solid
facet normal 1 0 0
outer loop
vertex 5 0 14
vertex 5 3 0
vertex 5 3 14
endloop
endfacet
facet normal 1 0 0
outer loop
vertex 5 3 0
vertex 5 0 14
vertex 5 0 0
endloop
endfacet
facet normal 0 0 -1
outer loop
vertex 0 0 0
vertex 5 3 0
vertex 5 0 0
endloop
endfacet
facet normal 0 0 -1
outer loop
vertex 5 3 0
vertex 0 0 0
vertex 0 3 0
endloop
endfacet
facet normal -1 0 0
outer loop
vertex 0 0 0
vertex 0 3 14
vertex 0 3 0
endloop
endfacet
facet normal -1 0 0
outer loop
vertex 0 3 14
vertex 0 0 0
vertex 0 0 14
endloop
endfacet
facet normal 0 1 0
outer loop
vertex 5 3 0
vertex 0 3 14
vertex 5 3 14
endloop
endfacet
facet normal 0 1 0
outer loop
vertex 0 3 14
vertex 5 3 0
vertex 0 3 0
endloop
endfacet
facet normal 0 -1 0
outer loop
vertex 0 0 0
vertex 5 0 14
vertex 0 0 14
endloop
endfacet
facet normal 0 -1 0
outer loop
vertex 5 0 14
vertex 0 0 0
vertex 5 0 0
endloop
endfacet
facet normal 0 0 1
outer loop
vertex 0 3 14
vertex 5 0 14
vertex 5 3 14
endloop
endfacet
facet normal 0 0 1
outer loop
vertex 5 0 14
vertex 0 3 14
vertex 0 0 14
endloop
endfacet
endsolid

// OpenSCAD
translate([2.5, 1.5, 1.0]) color([0.4049341374504143, 0.7837985890347726, 0.30331272607892745]) cube([5, 3, 2], center=true);
translate([2.5, 1.5, 3.0]) color([0.4765969541523558, 0.5833820394550312, 0.9081128851953352]) cube([5, 3, 2], center=true);
translate([2.5, 1.5, 5.0]) color([0.5046868558173903, 0.28183784439970383, 0.7558042041572239]) cube([5, 3, 2], center=true);
translate([2.5, 1.5, 7.0]) color([0.6183689966753316, 0.25050634136244054, 0.9097462559682401]) cube([5, 3, 2], center=true);
translate([2.5, 1.5, 9.0]) color([0.9827854760376531, 0.8102172359965896, 0.9021659504395827]) cube([5, 3, 2], center=true);
translate([2.5, 1.5, 11.0]) color([0.3101475693193326, 0.7298317482601286, 0.8988382879679935]) cube([5, 3, 2], center=true);
translate([2.5, 1.5, 13.0]) color([0.6839839319154413, 0.47214271545271336, 0.1007012080683658]) cube([5, 3, 2], center=true);
